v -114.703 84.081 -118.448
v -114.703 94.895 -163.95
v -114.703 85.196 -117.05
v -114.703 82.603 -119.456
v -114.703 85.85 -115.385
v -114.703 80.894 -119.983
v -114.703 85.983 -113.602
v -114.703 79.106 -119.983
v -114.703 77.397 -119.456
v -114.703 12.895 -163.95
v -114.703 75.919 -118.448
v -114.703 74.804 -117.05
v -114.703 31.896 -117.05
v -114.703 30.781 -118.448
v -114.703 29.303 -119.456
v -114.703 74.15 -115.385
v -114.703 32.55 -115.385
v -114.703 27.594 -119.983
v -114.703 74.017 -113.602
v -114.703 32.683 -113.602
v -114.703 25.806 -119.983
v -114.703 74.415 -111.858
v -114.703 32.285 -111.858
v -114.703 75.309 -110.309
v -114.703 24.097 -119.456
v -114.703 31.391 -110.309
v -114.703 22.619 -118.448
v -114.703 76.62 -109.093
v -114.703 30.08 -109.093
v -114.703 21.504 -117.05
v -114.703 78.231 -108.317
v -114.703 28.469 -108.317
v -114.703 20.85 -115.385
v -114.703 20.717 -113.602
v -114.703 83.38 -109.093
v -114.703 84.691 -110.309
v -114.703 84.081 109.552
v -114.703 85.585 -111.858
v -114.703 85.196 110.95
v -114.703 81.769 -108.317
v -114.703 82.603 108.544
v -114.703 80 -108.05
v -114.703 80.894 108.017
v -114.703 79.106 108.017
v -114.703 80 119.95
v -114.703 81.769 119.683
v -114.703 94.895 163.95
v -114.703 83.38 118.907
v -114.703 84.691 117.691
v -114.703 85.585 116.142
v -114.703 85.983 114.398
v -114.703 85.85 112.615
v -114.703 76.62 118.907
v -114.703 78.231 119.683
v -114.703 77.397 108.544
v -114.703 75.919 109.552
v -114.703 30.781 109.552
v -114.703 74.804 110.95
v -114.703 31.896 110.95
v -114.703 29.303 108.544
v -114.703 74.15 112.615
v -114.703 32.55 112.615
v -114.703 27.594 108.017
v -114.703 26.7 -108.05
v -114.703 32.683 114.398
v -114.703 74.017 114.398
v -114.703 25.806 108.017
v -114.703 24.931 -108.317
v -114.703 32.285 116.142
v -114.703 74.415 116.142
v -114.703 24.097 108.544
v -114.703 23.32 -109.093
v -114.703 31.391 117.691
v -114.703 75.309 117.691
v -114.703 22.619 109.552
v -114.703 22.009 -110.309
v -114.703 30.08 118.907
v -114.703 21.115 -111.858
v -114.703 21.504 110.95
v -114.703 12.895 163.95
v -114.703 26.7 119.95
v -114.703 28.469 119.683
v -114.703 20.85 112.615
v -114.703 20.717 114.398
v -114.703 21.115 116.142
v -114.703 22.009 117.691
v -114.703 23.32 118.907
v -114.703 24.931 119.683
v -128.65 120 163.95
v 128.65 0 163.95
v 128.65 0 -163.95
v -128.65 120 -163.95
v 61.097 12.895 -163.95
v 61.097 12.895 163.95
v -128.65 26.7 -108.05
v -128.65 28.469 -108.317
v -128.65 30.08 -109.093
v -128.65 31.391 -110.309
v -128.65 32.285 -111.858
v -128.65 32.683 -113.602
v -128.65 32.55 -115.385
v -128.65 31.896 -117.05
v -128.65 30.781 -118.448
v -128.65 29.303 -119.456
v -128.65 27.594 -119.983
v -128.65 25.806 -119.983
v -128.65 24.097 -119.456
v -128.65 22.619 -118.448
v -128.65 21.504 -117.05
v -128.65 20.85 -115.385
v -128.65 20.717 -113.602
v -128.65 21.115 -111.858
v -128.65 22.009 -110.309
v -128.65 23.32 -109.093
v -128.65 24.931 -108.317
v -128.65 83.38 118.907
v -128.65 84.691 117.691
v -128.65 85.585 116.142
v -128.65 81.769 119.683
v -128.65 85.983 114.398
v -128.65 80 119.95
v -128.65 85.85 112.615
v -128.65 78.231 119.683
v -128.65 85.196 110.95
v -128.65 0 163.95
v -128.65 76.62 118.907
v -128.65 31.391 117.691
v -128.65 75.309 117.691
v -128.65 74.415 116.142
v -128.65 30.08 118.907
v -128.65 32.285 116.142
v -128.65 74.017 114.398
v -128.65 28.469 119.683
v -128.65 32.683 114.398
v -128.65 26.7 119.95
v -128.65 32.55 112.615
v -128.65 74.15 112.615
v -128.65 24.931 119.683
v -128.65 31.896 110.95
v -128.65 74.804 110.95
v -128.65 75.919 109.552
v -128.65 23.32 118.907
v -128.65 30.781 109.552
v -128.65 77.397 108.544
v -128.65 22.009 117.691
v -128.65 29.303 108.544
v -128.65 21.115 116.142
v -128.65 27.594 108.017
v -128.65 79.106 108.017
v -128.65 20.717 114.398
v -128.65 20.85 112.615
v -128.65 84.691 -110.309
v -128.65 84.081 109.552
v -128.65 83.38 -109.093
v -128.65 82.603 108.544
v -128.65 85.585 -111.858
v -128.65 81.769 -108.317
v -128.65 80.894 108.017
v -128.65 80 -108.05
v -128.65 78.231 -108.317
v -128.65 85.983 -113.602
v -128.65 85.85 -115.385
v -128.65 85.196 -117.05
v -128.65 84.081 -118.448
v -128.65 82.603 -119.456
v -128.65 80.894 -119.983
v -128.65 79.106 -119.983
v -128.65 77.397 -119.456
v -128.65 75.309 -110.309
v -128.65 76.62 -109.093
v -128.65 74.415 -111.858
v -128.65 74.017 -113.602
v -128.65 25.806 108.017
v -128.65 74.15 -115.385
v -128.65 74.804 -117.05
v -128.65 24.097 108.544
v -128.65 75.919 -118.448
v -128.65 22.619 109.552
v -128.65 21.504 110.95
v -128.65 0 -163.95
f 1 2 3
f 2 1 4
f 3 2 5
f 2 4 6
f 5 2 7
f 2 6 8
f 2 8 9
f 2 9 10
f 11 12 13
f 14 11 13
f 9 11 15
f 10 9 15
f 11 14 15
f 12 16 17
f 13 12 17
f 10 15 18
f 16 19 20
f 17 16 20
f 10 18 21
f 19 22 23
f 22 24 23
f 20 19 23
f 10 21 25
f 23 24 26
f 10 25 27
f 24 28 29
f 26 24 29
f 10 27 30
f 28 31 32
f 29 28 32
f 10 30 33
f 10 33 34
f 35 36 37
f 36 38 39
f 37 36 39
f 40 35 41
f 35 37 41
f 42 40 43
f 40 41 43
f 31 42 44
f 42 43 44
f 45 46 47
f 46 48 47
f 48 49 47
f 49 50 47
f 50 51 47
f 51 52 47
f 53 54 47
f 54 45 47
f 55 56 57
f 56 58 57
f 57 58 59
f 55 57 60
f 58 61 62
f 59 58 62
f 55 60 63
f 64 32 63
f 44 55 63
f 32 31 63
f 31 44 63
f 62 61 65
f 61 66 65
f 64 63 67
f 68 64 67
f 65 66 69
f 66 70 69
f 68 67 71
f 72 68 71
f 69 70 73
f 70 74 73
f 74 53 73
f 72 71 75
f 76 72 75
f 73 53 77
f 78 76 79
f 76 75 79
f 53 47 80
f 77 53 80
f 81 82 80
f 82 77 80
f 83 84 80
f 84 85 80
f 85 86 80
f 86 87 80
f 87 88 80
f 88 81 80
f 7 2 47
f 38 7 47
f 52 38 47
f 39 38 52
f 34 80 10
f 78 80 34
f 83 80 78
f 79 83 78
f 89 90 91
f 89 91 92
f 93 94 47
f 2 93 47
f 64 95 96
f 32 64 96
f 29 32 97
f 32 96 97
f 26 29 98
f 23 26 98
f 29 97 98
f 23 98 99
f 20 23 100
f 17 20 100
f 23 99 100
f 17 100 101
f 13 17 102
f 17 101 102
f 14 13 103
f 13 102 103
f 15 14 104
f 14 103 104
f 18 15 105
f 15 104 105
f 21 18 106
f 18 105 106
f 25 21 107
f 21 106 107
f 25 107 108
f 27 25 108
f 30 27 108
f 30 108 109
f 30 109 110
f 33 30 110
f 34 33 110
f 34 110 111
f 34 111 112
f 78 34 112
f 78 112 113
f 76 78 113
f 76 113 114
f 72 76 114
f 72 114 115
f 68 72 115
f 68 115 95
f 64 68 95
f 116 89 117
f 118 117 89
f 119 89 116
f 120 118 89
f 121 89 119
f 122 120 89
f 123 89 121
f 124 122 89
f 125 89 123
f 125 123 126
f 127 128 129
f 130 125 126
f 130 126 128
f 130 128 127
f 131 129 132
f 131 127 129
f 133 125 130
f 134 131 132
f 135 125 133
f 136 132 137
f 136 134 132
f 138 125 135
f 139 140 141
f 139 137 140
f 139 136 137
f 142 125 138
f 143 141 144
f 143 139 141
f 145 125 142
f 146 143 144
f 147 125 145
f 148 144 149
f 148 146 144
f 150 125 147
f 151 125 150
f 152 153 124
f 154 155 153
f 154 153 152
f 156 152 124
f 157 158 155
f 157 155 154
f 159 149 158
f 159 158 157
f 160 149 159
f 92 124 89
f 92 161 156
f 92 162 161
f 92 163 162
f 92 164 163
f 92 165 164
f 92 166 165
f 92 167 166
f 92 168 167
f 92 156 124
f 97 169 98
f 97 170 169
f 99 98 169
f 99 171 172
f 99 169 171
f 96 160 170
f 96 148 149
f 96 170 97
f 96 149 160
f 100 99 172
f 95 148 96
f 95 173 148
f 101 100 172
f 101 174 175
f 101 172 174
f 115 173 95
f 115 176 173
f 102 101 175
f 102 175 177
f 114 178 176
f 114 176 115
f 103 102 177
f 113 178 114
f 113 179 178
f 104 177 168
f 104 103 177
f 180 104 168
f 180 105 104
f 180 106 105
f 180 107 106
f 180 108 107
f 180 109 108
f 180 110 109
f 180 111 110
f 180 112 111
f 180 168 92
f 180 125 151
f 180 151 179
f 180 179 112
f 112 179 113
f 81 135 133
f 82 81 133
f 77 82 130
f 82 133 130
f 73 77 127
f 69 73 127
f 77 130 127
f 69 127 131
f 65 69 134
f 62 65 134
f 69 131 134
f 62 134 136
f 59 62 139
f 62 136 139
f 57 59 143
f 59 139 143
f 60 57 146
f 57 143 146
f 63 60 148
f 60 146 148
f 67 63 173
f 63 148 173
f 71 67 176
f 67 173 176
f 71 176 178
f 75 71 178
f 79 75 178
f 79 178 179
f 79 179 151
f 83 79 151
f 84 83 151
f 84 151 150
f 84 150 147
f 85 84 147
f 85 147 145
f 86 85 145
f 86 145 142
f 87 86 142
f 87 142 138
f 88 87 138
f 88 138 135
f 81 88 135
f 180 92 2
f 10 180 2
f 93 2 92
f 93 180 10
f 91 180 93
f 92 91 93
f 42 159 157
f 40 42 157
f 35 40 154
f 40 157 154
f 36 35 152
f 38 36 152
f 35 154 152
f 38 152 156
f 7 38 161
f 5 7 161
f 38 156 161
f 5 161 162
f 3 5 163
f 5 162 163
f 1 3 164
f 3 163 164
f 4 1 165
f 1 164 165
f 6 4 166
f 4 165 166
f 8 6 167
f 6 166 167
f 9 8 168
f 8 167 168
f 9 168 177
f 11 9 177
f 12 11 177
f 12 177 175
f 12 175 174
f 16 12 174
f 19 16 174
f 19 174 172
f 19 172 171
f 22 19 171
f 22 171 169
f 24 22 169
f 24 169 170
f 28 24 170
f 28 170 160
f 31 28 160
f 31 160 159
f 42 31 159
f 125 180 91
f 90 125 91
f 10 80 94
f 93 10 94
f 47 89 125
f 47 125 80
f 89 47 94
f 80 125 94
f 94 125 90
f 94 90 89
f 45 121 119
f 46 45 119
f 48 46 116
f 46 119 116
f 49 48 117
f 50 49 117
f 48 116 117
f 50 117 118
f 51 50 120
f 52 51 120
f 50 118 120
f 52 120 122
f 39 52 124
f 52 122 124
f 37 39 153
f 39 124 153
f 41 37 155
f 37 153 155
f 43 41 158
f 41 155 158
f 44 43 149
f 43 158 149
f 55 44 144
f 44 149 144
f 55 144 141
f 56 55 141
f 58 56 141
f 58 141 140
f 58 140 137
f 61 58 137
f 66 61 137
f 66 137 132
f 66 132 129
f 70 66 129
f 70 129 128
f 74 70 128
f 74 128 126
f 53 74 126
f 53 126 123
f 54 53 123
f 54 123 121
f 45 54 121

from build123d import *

# Parameters (mm, degrees)
SKETCH2_W           = 257.3
SKETCH2_H           = 327.9
BOSS_EXTRUDE1_DEPTH = 120
CUT_EXTRUDE1_DEPTH  = 330
CUT_EXTRUDE2_DEPTH  = 425
SKETCH5_R           = 6
CUT_EXTRUDE3_DEPTH  = 21


with BuildPart() as part:
    # Sketch2 → Boss-Extrude1 (new body)
    with BuildSketch(Plane(origin=(0, 0, 0), x_dir=(1, 0, 0), z_dir=(0, 1, 0))):
        Rectangle(SKETCH2_W, SKETCH2_H)
    extrude(amount=BOSS_EXTRUDE1_DEPTH)

    # Sketch3 → Cut-Extrude1 (cut)
    with BuildSketch(Plane.XY.offset(163.95)):
        Polygon((128.65, 0), (-128.65, 120), (128.65, 120), align=None)
    extrude(amount=-CUT_EXTRUDE1_DEPTH, mode=Mode.SUBTRACT)

    # Sketch4 → Cut-Extrude2 (cut)
    with BuildSketch(Plane.XY.offset(163.95)):
        Polygon((-114.703132504, 94.894537232), (-114.703132504, 12.894537232), (61.096867496, 12.894537232), align=None)
    extrude(amount=-CUT_EXTRUDE2_DEPTH, mode=Mode.SUBTRACT)

    # Sketch5 → Cut-Extrude3 (cut)
    with BuildSketch(Plane.ZY.offset(128.65)):
        with Locations((-114.05, 80)):
            Circle(SKETCH5_R)
        with Locations((-114.05, 26.7)):
            Circle(SKETCH5_R)
        with Locations((113.95, 80)):
            Circle(SKETCH5_R)
        with Locations((113.95, 26.7)):
            Circle(SKETCH5_R)
    extrude(amount=-CUT_EXTRUDE3_DEPTH, mode=Mode.SUBTRACT)


solid = part.part
